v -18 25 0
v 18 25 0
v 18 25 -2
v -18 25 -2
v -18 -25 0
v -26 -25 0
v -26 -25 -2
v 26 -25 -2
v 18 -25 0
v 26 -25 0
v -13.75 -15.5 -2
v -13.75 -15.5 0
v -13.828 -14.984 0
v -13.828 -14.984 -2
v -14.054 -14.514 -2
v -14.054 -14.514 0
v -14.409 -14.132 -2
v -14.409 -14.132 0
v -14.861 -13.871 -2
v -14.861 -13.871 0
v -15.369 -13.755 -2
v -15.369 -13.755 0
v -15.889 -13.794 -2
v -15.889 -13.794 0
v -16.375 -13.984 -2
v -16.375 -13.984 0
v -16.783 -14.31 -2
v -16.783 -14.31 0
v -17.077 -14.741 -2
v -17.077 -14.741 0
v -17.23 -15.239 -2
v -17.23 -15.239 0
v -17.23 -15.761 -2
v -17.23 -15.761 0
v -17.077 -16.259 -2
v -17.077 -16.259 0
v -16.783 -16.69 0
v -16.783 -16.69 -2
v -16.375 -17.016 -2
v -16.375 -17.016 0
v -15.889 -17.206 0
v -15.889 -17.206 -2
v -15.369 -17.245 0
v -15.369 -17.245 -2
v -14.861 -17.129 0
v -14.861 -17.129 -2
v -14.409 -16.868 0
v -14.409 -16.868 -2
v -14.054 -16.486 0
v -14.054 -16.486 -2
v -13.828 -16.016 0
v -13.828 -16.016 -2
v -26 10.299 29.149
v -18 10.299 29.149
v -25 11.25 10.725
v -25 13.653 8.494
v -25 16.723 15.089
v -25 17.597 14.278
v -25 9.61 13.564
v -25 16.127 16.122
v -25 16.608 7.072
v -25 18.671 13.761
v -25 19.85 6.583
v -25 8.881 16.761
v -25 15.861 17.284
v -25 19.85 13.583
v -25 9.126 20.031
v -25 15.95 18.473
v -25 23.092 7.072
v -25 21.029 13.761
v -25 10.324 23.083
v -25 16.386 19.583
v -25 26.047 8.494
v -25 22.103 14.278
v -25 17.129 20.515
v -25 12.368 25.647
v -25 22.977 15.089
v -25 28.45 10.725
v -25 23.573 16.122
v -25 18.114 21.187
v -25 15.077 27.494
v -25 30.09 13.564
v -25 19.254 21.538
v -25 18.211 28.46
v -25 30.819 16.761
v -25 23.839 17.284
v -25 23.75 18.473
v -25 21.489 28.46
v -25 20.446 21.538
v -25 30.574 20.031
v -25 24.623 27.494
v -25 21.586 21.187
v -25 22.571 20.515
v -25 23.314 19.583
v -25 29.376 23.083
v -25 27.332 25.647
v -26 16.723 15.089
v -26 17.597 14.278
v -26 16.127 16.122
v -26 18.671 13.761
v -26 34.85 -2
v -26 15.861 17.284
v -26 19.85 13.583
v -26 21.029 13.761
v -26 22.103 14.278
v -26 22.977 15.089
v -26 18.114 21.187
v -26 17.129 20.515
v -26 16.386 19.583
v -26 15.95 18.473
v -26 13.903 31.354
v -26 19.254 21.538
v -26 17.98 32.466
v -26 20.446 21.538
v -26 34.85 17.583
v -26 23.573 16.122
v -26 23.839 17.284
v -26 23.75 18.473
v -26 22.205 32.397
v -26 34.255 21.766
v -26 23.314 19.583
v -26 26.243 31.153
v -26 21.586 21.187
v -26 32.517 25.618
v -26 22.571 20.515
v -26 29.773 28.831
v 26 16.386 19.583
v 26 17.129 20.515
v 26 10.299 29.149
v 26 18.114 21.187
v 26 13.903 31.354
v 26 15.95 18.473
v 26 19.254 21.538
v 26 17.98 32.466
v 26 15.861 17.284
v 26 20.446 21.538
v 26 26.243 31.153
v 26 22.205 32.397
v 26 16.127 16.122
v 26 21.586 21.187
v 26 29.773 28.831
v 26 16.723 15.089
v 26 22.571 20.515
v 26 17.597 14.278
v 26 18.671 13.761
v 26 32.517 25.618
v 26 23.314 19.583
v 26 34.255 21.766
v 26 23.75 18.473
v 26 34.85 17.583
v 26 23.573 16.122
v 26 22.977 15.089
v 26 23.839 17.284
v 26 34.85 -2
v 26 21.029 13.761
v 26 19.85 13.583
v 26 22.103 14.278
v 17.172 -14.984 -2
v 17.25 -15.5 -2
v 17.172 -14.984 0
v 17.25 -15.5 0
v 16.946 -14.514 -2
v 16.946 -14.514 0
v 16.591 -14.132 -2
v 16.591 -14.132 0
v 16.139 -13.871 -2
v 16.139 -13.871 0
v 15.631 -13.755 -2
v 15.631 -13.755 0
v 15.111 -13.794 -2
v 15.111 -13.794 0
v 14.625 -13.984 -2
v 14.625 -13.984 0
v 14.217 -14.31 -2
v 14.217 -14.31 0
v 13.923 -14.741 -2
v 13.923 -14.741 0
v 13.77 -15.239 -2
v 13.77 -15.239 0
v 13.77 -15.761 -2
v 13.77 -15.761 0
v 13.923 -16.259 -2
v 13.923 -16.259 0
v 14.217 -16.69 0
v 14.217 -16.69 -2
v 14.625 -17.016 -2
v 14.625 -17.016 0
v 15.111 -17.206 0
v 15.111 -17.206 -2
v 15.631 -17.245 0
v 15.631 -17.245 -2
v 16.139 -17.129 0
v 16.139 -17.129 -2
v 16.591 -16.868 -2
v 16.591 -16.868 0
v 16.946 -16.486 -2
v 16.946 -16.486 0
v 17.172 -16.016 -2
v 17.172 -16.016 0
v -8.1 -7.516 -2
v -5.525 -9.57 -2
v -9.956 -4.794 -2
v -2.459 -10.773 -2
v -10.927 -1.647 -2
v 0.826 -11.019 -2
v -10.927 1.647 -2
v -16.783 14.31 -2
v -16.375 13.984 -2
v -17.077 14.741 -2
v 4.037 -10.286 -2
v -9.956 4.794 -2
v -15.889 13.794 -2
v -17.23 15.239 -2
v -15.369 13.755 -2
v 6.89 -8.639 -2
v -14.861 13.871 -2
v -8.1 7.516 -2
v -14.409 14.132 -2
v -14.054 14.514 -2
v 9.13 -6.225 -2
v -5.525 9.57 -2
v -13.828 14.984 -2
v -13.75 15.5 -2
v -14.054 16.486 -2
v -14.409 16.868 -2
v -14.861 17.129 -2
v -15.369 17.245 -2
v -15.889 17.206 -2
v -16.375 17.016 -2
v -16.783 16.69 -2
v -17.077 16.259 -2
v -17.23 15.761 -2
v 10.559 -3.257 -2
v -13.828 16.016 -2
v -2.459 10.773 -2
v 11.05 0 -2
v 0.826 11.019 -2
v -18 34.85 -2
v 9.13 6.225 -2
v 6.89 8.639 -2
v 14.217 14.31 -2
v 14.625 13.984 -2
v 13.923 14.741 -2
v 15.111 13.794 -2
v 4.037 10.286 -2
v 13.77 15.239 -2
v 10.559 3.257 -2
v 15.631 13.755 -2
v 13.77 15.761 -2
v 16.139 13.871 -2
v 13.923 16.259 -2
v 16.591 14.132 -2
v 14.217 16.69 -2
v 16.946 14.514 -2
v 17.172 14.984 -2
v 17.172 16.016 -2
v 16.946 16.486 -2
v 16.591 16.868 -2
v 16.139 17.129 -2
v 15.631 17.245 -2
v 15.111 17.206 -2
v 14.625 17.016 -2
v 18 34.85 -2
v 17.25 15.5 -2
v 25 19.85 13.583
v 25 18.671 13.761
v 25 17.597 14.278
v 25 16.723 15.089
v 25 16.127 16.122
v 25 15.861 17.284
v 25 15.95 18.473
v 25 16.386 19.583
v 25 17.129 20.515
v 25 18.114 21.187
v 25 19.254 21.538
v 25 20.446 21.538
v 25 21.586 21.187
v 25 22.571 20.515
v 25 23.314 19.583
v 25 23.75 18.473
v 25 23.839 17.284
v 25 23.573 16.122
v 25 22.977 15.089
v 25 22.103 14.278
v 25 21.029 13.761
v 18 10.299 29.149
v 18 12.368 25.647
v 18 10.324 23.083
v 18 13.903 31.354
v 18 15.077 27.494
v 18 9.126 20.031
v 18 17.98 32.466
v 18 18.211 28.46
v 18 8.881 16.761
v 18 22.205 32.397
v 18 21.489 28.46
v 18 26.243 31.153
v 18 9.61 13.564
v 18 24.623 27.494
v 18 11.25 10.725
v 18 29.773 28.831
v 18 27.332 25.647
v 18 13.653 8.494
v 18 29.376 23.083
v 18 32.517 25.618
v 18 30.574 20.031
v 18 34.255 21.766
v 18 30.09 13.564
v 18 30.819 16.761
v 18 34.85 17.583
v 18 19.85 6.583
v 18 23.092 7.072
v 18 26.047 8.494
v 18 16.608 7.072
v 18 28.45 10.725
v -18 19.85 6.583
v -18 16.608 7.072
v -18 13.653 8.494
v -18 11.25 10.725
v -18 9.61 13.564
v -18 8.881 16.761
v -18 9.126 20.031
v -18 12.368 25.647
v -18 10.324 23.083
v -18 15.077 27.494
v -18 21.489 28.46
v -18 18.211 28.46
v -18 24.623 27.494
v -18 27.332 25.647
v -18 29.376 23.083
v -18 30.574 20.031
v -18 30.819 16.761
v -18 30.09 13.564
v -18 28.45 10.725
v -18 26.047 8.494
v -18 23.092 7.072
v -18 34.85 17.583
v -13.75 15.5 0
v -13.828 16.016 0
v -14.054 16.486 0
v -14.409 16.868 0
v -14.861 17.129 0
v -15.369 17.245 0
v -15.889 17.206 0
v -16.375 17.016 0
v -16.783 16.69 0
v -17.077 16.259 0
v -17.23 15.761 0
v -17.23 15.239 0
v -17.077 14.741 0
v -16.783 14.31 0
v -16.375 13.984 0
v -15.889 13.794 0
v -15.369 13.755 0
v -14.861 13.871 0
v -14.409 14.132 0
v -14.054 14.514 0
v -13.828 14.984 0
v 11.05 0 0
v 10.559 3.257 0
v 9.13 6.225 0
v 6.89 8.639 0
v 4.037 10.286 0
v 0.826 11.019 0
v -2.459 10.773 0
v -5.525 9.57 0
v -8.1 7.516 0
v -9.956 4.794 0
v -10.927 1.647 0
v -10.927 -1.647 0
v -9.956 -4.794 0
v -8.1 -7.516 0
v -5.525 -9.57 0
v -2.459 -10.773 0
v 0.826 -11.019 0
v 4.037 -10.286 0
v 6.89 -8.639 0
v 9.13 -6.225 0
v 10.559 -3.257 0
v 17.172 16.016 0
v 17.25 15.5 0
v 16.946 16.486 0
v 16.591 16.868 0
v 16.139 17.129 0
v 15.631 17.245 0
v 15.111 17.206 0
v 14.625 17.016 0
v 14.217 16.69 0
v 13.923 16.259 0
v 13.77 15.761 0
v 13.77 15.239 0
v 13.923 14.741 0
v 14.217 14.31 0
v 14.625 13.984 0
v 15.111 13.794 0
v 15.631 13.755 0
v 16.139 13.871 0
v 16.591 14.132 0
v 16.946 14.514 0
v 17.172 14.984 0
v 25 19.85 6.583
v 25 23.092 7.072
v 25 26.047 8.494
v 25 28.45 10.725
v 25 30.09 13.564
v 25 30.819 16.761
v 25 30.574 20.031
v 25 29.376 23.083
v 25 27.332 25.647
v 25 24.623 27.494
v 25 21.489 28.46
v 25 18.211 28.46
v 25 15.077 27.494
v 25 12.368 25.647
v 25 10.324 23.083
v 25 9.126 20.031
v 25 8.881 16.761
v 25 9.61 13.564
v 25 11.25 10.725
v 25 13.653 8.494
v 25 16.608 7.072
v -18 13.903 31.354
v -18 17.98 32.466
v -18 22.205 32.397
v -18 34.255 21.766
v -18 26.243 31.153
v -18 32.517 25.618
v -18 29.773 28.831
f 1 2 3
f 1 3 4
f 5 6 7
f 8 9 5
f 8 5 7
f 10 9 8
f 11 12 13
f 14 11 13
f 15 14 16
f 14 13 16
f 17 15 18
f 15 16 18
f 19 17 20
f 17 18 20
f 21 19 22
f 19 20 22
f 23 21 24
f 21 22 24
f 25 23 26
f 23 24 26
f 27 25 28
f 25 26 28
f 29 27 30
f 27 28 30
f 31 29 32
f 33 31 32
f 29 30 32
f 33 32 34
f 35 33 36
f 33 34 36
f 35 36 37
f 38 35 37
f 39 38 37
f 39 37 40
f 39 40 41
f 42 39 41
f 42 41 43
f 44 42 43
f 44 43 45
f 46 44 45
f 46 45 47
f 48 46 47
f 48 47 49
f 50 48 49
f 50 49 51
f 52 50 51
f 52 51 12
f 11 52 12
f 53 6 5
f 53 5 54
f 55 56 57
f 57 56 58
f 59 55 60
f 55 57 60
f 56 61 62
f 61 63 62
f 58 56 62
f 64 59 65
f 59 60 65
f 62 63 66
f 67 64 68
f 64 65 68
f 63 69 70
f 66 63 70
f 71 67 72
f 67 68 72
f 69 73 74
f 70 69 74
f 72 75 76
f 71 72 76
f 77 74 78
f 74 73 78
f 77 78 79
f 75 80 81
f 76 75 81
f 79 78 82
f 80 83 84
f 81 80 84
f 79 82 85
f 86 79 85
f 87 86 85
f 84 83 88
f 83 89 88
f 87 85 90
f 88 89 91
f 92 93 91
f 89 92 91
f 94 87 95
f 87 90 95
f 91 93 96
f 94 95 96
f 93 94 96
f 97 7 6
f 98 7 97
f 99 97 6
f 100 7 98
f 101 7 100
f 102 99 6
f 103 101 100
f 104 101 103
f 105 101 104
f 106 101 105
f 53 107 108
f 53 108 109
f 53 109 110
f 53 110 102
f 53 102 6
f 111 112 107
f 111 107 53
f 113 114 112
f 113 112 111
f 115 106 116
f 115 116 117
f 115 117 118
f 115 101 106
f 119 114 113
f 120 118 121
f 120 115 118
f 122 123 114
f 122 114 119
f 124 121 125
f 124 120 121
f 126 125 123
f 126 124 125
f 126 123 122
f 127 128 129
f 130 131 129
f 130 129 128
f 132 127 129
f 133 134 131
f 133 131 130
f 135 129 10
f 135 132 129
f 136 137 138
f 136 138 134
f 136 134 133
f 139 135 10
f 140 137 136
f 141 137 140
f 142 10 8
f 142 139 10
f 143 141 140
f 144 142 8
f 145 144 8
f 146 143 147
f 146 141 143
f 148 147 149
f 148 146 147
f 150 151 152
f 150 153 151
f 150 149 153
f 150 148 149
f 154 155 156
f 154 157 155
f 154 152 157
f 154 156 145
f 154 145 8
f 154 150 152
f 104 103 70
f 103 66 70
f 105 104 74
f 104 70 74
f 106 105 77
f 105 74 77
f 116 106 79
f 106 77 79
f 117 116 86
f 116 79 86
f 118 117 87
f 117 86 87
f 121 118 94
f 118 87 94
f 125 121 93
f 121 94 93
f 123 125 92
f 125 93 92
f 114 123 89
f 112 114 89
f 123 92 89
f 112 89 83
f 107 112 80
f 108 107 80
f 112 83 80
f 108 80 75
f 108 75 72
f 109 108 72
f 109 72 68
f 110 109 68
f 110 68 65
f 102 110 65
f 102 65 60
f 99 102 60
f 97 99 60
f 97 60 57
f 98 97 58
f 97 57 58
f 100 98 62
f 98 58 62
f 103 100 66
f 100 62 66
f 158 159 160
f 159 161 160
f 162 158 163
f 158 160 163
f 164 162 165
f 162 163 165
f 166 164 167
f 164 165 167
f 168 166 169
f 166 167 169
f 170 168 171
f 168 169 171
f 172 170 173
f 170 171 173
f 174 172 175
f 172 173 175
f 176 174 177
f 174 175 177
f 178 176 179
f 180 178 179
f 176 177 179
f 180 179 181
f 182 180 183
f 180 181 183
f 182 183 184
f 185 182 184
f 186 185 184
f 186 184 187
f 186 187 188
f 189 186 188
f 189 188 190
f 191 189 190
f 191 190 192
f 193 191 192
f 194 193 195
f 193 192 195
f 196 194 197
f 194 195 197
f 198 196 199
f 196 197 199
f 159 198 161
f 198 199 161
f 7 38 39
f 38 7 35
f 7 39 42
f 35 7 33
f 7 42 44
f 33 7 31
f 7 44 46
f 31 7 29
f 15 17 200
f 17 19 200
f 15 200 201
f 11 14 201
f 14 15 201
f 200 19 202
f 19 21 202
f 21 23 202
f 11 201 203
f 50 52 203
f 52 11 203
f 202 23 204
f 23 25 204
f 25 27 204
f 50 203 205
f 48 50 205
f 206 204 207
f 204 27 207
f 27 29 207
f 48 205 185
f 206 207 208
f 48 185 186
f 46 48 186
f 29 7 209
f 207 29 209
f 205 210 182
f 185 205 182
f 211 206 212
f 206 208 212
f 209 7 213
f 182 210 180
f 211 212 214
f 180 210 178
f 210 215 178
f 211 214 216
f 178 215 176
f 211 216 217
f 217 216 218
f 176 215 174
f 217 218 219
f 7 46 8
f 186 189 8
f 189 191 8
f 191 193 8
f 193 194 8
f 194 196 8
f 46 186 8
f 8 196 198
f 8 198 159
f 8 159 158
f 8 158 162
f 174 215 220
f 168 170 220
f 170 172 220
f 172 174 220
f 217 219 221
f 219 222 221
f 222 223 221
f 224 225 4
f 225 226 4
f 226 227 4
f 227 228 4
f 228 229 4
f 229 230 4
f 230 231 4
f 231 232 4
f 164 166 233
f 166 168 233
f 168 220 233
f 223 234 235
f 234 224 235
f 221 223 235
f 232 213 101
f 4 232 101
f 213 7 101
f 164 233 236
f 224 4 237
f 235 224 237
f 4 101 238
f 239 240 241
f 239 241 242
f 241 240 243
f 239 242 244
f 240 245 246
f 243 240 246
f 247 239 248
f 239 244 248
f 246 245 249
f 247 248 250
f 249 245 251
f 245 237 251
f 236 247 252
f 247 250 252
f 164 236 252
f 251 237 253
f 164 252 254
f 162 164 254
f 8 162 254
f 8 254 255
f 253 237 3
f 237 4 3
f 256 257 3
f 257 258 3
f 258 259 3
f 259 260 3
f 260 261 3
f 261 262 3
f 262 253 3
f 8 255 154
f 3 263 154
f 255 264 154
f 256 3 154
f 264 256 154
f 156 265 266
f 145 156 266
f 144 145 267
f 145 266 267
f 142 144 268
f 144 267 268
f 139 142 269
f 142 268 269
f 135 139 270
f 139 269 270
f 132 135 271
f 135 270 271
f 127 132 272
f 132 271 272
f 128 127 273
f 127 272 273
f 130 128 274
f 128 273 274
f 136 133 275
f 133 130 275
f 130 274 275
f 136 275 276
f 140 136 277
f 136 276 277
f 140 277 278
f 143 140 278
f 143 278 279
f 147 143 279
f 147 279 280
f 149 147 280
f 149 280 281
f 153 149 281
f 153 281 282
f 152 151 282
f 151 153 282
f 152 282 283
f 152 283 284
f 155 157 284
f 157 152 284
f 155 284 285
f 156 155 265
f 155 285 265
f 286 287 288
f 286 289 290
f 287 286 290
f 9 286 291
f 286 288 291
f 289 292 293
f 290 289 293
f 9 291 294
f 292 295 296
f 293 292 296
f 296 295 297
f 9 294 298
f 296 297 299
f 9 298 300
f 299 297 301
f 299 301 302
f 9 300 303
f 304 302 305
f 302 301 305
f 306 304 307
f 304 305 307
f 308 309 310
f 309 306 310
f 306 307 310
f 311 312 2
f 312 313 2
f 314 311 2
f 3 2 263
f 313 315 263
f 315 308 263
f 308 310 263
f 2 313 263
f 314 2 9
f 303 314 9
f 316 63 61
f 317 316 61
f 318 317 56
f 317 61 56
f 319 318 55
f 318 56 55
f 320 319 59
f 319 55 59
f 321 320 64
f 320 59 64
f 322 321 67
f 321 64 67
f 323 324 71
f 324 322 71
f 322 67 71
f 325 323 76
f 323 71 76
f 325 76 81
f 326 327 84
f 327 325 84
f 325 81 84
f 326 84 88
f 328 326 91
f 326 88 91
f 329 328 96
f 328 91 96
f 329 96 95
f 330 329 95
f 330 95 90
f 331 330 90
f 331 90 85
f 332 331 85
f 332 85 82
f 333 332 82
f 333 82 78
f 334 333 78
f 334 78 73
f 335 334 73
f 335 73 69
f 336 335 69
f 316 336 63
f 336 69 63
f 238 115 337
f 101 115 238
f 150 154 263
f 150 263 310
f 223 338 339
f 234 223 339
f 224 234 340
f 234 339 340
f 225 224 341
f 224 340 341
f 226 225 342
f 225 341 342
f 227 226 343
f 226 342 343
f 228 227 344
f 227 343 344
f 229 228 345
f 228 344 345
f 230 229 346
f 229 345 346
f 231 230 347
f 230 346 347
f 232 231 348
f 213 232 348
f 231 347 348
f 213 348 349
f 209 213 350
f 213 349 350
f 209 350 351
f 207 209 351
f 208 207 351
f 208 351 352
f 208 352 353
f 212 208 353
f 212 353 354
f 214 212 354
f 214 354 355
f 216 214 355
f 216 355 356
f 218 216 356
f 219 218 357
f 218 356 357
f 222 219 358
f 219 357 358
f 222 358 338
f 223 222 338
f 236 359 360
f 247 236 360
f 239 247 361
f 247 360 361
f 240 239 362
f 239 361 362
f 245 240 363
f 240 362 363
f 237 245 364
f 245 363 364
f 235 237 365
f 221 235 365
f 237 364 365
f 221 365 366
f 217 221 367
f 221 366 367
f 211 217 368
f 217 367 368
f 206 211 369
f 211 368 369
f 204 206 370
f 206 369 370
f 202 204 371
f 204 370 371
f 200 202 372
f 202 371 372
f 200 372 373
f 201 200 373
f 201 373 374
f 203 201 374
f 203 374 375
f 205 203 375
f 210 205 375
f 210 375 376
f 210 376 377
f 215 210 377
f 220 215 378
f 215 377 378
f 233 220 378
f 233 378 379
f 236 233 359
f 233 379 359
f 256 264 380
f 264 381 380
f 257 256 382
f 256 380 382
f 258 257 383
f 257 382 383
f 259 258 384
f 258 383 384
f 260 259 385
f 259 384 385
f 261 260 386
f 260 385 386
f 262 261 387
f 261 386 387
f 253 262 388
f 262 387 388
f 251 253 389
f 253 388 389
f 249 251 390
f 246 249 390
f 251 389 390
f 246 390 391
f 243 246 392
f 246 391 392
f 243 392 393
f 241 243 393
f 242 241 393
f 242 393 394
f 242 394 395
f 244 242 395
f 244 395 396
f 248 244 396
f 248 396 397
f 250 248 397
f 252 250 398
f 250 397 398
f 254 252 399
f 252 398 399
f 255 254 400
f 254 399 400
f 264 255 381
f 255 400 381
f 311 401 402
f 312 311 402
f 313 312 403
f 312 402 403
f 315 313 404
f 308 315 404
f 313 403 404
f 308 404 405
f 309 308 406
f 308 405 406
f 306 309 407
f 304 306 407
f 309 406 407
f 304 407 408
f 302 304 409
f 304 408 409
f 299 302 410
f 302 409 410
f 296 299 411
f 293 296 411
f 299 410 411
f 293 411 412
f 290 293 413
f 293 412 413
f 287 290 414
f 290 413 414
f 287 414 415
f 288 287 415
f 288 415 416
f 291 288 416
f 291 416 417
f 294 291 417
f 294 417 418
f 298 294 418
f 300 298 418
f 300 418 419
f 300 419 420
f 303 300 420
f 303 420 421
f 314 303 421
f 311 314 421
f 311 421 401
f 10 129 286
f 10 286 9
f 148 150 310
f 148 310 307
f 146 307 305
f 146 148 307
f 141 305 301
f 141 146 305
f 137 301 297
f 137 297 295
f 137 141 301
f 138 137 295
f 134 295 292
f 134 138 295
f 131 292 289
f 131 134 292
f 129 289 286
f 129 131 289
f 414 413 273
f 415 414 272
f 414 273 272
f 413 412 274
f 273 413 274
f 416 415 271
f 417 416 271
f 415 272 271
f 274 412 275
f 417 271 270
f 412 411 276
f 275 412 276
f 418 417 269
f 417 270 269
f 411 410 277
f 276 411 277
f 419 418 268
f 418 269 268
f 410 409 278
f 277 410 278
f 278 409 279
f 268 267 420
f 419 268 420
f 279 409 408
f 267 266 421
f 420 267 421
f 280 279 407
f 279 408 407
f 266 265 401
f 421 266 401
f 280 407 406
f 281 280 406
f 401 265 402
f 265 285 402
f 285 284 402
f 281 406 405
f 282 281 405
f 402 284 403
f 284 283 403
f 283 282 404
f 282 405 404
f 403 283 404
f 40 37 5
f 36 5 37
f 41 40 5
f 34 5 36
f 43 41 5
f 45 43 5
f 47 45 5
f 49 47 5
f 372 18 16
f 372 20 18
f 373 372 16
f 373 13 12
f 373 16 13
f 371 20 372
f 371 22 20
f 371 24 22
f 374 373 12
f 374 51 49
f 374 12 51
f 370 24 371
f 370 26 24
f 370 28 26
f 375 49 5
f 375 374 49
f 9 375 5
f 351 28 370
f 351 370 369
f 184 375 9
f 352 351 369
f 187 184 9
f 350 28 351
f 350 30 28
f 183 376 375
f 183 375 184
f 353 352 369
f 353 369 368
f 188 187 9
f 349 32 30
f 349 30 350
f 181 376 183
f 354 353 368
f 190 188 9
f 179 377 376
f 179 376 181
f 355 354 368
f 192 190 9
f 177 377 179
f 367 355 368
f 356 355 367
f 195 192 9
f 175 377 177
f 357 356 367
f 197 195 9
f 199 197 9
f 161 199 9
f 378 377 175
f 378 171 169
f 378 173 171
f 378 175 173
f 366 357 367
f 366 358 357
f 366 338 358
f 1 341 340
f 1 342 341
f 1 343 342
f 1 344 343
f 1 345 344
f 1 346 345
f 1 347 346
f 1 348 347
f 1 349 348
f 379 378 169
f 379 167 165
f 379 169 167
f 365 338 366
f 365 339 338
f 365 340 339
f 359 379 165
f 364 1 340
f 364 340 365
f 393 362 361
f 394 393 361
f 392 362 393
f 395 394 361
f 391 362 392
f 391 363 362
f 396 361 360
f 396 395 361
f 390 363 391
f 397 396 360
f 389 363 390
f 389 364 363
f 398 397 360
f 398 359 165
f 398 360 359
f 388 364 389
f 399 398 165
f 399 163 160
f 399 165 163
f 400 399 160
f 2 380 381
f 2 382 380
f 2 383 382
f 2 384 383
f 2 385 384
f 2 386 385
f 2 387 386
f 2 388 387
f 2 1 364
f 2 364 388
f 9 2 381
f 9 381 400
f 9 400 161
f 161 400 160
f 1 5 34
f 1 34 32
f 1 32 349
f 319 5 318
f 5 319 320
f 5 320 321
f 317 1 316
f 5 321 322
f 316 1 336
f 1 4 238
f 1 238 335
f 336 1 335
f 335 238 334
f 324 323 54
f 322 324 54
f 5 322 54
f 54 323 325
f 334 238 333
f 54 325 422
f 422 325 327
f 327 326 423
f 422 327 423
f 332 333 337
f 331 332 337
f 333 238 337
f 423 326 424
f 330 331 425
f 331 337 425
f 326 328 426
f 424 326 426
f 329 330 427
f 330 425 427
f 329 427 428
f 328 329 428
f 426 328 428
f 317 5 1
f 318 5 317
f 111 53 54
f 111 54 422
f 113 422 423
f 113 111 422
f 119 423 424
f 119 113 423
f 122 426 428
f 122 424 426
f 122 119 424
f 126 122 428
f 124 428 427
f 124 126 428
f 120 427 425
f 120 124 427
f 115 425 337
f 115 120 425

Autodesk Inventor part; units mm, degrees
ref_plane "YZ Plane" through (0, 0, 0) normal (1, 0, 0) x (0, 1, 0)
ref_plane "XZ Plane" through (0, 0, 0) normal (0, 1, 0) x (-1, 0, 0)
ref_plane "XY Plane" through (0, 0, 0) normal (0, 0, 1) x (1, 0, 0)
sketch "Sketch1" plane through (0, 0, 0) normal (0, 0, 1) x (1, 0, 0)
  circle A0 centre (-15.5, 15.5) radius 1.75
  circle A1 centre (15.5, 15.5) radius 1.75
  circle A2 centre (-15.5, -15.5) radius 1.75
  circle A3 centre (15.5, -15.5) radius 1.75
  circle A4 centre (0, 0) radius 11.05
  line L0 (-15.5, 15.5) -> (15.5, 15.5) construction
  line L1 (15.5, 15.5) -> (15.5, -15.5) construction
  line L2 (15.5, -15.5) -> (-15.5, -15.5) construction
  line L3 (-15.5, -15.5) -> (-15.5, 15.5) construction
  line L4 (-15.5, 15.5) -> (15.5, -15.5) construction
  line L5 (15.5, 15.5) -> (-15.5, -15.5) construction
  line L6 (-25, 25) -> (-25, -25)
  line L7 (-25, -25) -> (25, -25)
  line L8 (25, -25) -> (25, 25)
  line L9 (25, 25) -> (-25, 25)
  dimension "d0" = 22.1
  dimension "d1" = 31
  dimension "d2" = 31
  dimension "d3" = 3.5
  dimension "d4" = 50
  dimension "d5" = 50
extrude "Extrusion1" add sketch "Sketch1" against normal blind 2
sketch "Sketch2" plane through (25, -25, 0) normal (1, 0, 0) x (0, 0, -1)
  line L0 (0, 0) -> (0, 50) projected
  line L1 (0, 0) -> (2, 0) projected
  line L2 (2, 50) -> (2, 0) projected
  line L3 (0, 50) -> (2, 50) projected
  line L4 (0, 0) -> (0, 50) projected
  line L5 (0, 59.85) -> (-17.583, 59.85)
  line L6 (-29.1492, 35.2989) -> (0, 0)
  line L7 (0, 38.75) -> (0, 42.25) construction
  line L8 (0, 44.85) -> (-34.6915, 44.85) construction
  line L9 (2, 50) -> (2, 59.85)
  line L10 (2, 59.85) -> (0, 59.85)
  circle A0 centre (-17.583, 44.85) radius 4
  circle A1 centre (-17.583, 44.85) radius 11
  circle A2 centre (-17.583, 44.85) radius 13
  arc A3 (-17.583, 59.85) -> (-29.1492, 35.2989) centre (-17.583, 44.85) ccw
  point P0 (0, 25)
  dimension "d8" = 19.85
  dimension "d9" = 19.583
  dimension "d10" = 8
  dimension "d11" = 22
  dimension "d12" = 2
  dimension "d13" = 2
extrude "Extrusion2" add sketch "Sketch2" against normal blind 7 contours L6 A3 L5 L10 L9 L3 L0 | A2
extrude "Extrusion3" add sketch "Sketch2" along normal blind 1 contours L6 A3 L5 L10 L9 L3 L0 | L0 L3 L2 L1 | A1 | A2
mirror "Mirror1" about plane through (0, 0, 0) normal (1, 0, 0) of "Extrusion2", "Extrusion3"
properties part number "Worm Gear Box" material "PC/ABS Plastic"
